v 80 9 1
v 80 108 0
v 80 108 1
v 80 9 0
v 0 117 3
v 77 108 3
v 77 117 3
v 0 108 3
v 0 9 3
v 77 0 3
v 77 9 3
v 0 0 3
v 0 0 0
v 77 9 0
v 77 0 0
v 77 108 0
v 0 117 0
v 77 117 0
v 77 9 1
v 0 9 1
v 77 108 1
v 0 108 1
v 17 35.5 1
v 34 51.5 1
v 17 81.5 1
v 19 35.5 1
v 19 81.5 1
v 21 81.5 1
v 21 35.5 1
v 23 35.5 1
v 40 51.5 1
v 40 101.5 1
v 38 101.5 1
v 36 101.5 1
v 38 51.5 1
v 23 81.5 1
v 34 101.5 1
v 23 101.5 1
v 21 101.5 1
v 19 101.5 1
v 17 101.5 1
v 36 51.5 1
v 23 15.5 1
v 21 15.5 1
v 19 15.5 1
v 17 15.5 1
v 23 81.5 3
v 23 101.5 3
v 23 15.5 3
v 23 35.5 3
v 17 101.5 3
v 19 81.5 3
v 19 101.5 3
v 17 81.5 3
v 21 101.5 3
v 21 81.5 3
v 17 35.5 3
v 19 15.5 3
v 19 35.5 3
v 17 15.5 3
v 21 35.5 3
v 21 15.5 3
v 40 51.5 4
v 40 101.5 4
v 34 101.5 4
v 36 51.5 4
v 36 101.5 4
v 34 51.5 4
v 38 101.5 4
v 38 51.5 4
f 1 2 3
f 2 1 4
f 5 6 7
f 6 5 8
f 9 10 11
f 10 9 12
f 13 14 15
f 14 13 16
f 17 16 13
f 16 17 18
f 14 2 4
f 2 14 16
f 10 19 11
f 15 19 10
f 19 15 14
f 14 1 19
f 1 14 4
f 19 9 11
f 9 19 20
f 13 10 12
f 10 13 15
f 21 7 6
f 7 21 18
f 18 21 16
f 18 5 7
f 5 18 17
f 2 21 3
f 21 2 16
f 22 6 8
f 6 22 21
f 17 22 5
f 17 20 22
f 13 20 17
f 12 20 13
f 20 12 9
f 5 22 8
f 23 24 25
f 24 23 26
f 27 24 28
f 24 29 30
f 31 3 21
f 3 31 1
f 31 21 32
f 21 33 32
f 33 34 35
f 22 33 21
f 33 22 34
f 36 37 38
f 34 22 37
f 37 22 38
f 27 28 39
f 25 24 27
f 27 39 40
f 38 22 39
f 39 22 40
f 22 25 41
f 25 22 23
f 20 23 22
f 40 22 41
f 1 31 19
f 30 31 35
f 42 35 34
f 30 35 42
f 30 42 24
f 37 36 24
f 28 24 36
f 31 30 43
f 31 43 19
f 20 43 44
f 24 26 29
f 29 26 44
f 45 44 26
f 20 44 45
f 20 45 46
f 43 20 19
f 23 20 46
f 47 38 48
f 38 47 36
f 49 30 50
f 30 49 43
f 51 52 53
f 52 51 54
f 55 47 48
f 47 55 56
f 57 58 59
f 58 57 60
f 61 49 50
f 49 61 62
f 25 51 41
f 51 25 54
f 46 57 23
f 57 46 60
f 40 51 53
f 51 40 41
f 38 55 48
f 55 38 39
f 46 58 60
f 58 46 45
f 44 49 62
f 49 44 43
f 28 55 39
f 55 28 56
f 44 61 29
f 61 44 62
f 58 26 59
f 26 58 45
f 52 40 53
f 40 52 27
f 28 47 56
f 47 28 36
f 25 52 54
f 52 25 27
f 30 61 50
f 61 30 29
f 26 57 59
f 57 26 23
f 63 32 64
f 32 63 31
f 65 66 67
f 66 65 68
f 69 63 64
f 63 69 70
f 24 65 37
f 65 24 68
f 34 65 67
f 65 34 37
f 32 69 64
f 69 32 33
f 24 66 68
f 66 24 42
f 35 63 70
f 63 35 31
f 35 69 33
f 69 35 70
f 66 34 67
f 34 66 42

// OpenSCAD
// file: pistation.scad
/*--------------------------------------------------------------------------*
* Defines all the sizes we need. This file is used by all other SCADs
*--------------------------------------------------------------------------*/

// Define the dimensions of the things we need to place
LCD_OUTER_WIDTH  = 105;
LCD_OUTER_HEIGHT = 68;
LCD_OUTER_DEPTH  = 3;

LCD_INNER_WIDTH  = 98;
LCD_INNER_HEIGHT = 57;
LCD_INNER_DEPTH  = 1;

LCD_UPPER_SPACE = 3;
LCD_LOWER_SPACE = 8;
LCD_LEFT_SPACE  = 3.5;
LCD_RIGHT_SPACE = 3.5;

BUTTON_DIAMETER = 10;
BUTTON_DEPTH    = 7;
BUTTON_SPACE    = 3;
BUTTON_BOARD    = 18;

GENERAL_SPACE   = 6;

FRAME_WIDTH = 80;
FRAME_STEP  = 10;

FRONT_ANGLE = 10;

MDF_SIZE = 3;

// Now calculate the extra sizes
BLOCK_WIDTH  = GENERAL_SPACE + LCD_OUTER_WIDTH + GENERAL_SPACE;
BLOCK_HEIGHT = GENERAL_SPACE + LCD_OUTER_HEIGHT + GENERAL_SPACE + BUTTON_DIAMETER + BUTTON_BOARD;
BLOCK_DEPTH  = LCD_OUTER_DEPTH + LCD_INNER_DEPTH;

TOTAL_BUTTON_WIDTH  = (4 * BUTTON_DIAMETER) + (3 *BUTTON_SPACE);
TOTAL_BUTTON_HEIGHT = BUTTON_DIAMETER;

PANEL_SIDE_WIDTH  = BLOCK_HEIGHT * sin(FRONT_ANGLE);
PANEL_SIDE_HEIGHT = BLOCK_HEIGHT * cos(FRONT_ANGLE);

FRAME_HEIGHT = FRAME_STEP + PANEL_SIDE_HEIGHT;

/** Create a frame
 *
 * This creates the left frame (without any cutouts). It is used as the basis
 * for the left and right frame SCAD files.
 */
module frame() {
  // Let's make the frame components
  cube(size = [ FRAME_WIDTH, GENERAL_SPACE, GENERAL_SPACE ], center = false);
  cube(size = [ GENERAL_SPACE, FRAME_STEP, GENERAL_SPACE ], center = false);
  translate(v = [ PANEL_SIDE_WIDTH, 0, 0 ]) {
    cube(size = [ GENERAL_SPACE, FRAME_HEIGHT, GENERAL_SPACE ], center = false);
    }
  translate(v = [ 0, FRAME_STEP, 0 ]) {
    rotate(a = [ 0, 0, -FRONT_ANGLE ]) {
      cube(size = [ GENERAL_SPACE, BLOCK_HEIGHT, GENERAL_SPACE ], center = false);
      }
    }
  }
// main file
/*--------------------------------------------------------------------------*
* The printable base plate
*--------------------------------------------------------------------------*/
include <pistation.scad>

// Create the base plate
difference() {
  cube(size = [ FRAME_WIDTH, BLOCK_WIDTH, MDF_SIZE ], center = false);
  // Cut out the center so it's not as thick
  translate(v = [ 0, (2 * GENERAL_SPACE) - MDF_SIZE, 1 ]) {
    cube(size = [ FRAME_WIDTH, BLOCK_WIDTH - (2 * ((2 * GENERAL_SPACE) - MDF_SIZE)), MDF_SIZE ], center = false);
    }
  // Cut out notches for the front
  translate(v = [ FRAME_WIDTH - MDF_SIZE, 0, 0 ]) {
    cube(size = [ MDF_SIZE, (2 * GENERAL_SPACE) - MDF_SIZE, MDF_SIZE ], center = false);
    translate(v = [ 0, BLOCK_WIDTH - ((2 * GENERAL_SPACE) - MDF_SIZE), 0 ]) {
      cube(size = [ MDF_SIZE, (2 * GENERAL_SPACE) - MDF_SIZE, MDF_SIZE ], center = false);
      }
    }
  }

// Create a slot to hold the Raspberry Pi PCB
RASPBERRY_PI_WIDTH = 86;
RASPBERRY_PI_DEPTH = 18;
RASPBERRY_PI_SPACE = 20;
RASPBERRY_PI_SLOT  = 2;

translate(v = [ RASPBERRY_PI_DEPTH - (RASPBERRY_PI_SLOT / 2), (BLOCK_WIDTH - RASPBERRY_PI_WIDTH) / 2, 0 ]) {
  difference() {
    cube(size = [ RASPBERRY_PI_SLOT * 3, RASPBERRY_PI_WIDTH, MDF_SIZE ], center = false);
    translate(v = [ RASPBERRY_PI_SLOT, 0, 1 ]) {
      cube(size = [ RASPBERRY_PI_SLOT, RASPBERRY_PI_WIDTH, MDF_SIZE ], center = false);
      }
    translate(v = [ 0, RASPBERRY_PI_SPACE, 1 ]) {
      cube(size = [ RASPBERRY_PI_SLOT * 3, RASPBERRY_PI_WIDTH - (2 * RASPBERRY_PI_SPACE), MDF_SIZE ], center = false);
      }
    }
  }

// Create a slot to hold the power board
POWER_WIDTH = 50;
POWER_SLOT  = 2;
POWER_DEPTH = 3;
POWER_SPACE = 10;

translate(v = [ RASPBERRY_PI_DEPTH + (3 * RASPBERRY_PI_SLOT) + POWER_SPACE, BLOCK_WIDTH - ((BLOCK_WIDTH - RASPBERRY_PI_WIDTH) / 2) - POWER_WIDTH, 0 ]) {
  difference() {
    cube(size = [ POWER_SLOT * 3, POWER_WIDTH, POWER_DEPTH + 1 ], center = false);
    translate(v = [ POWER_SLOT, 0, 1 ]) {
      cube(size = [ POWER_SLOT, POWER_WIDTH, POWER_DEPTH + 1 ], center = false);
      }
    }
  }
